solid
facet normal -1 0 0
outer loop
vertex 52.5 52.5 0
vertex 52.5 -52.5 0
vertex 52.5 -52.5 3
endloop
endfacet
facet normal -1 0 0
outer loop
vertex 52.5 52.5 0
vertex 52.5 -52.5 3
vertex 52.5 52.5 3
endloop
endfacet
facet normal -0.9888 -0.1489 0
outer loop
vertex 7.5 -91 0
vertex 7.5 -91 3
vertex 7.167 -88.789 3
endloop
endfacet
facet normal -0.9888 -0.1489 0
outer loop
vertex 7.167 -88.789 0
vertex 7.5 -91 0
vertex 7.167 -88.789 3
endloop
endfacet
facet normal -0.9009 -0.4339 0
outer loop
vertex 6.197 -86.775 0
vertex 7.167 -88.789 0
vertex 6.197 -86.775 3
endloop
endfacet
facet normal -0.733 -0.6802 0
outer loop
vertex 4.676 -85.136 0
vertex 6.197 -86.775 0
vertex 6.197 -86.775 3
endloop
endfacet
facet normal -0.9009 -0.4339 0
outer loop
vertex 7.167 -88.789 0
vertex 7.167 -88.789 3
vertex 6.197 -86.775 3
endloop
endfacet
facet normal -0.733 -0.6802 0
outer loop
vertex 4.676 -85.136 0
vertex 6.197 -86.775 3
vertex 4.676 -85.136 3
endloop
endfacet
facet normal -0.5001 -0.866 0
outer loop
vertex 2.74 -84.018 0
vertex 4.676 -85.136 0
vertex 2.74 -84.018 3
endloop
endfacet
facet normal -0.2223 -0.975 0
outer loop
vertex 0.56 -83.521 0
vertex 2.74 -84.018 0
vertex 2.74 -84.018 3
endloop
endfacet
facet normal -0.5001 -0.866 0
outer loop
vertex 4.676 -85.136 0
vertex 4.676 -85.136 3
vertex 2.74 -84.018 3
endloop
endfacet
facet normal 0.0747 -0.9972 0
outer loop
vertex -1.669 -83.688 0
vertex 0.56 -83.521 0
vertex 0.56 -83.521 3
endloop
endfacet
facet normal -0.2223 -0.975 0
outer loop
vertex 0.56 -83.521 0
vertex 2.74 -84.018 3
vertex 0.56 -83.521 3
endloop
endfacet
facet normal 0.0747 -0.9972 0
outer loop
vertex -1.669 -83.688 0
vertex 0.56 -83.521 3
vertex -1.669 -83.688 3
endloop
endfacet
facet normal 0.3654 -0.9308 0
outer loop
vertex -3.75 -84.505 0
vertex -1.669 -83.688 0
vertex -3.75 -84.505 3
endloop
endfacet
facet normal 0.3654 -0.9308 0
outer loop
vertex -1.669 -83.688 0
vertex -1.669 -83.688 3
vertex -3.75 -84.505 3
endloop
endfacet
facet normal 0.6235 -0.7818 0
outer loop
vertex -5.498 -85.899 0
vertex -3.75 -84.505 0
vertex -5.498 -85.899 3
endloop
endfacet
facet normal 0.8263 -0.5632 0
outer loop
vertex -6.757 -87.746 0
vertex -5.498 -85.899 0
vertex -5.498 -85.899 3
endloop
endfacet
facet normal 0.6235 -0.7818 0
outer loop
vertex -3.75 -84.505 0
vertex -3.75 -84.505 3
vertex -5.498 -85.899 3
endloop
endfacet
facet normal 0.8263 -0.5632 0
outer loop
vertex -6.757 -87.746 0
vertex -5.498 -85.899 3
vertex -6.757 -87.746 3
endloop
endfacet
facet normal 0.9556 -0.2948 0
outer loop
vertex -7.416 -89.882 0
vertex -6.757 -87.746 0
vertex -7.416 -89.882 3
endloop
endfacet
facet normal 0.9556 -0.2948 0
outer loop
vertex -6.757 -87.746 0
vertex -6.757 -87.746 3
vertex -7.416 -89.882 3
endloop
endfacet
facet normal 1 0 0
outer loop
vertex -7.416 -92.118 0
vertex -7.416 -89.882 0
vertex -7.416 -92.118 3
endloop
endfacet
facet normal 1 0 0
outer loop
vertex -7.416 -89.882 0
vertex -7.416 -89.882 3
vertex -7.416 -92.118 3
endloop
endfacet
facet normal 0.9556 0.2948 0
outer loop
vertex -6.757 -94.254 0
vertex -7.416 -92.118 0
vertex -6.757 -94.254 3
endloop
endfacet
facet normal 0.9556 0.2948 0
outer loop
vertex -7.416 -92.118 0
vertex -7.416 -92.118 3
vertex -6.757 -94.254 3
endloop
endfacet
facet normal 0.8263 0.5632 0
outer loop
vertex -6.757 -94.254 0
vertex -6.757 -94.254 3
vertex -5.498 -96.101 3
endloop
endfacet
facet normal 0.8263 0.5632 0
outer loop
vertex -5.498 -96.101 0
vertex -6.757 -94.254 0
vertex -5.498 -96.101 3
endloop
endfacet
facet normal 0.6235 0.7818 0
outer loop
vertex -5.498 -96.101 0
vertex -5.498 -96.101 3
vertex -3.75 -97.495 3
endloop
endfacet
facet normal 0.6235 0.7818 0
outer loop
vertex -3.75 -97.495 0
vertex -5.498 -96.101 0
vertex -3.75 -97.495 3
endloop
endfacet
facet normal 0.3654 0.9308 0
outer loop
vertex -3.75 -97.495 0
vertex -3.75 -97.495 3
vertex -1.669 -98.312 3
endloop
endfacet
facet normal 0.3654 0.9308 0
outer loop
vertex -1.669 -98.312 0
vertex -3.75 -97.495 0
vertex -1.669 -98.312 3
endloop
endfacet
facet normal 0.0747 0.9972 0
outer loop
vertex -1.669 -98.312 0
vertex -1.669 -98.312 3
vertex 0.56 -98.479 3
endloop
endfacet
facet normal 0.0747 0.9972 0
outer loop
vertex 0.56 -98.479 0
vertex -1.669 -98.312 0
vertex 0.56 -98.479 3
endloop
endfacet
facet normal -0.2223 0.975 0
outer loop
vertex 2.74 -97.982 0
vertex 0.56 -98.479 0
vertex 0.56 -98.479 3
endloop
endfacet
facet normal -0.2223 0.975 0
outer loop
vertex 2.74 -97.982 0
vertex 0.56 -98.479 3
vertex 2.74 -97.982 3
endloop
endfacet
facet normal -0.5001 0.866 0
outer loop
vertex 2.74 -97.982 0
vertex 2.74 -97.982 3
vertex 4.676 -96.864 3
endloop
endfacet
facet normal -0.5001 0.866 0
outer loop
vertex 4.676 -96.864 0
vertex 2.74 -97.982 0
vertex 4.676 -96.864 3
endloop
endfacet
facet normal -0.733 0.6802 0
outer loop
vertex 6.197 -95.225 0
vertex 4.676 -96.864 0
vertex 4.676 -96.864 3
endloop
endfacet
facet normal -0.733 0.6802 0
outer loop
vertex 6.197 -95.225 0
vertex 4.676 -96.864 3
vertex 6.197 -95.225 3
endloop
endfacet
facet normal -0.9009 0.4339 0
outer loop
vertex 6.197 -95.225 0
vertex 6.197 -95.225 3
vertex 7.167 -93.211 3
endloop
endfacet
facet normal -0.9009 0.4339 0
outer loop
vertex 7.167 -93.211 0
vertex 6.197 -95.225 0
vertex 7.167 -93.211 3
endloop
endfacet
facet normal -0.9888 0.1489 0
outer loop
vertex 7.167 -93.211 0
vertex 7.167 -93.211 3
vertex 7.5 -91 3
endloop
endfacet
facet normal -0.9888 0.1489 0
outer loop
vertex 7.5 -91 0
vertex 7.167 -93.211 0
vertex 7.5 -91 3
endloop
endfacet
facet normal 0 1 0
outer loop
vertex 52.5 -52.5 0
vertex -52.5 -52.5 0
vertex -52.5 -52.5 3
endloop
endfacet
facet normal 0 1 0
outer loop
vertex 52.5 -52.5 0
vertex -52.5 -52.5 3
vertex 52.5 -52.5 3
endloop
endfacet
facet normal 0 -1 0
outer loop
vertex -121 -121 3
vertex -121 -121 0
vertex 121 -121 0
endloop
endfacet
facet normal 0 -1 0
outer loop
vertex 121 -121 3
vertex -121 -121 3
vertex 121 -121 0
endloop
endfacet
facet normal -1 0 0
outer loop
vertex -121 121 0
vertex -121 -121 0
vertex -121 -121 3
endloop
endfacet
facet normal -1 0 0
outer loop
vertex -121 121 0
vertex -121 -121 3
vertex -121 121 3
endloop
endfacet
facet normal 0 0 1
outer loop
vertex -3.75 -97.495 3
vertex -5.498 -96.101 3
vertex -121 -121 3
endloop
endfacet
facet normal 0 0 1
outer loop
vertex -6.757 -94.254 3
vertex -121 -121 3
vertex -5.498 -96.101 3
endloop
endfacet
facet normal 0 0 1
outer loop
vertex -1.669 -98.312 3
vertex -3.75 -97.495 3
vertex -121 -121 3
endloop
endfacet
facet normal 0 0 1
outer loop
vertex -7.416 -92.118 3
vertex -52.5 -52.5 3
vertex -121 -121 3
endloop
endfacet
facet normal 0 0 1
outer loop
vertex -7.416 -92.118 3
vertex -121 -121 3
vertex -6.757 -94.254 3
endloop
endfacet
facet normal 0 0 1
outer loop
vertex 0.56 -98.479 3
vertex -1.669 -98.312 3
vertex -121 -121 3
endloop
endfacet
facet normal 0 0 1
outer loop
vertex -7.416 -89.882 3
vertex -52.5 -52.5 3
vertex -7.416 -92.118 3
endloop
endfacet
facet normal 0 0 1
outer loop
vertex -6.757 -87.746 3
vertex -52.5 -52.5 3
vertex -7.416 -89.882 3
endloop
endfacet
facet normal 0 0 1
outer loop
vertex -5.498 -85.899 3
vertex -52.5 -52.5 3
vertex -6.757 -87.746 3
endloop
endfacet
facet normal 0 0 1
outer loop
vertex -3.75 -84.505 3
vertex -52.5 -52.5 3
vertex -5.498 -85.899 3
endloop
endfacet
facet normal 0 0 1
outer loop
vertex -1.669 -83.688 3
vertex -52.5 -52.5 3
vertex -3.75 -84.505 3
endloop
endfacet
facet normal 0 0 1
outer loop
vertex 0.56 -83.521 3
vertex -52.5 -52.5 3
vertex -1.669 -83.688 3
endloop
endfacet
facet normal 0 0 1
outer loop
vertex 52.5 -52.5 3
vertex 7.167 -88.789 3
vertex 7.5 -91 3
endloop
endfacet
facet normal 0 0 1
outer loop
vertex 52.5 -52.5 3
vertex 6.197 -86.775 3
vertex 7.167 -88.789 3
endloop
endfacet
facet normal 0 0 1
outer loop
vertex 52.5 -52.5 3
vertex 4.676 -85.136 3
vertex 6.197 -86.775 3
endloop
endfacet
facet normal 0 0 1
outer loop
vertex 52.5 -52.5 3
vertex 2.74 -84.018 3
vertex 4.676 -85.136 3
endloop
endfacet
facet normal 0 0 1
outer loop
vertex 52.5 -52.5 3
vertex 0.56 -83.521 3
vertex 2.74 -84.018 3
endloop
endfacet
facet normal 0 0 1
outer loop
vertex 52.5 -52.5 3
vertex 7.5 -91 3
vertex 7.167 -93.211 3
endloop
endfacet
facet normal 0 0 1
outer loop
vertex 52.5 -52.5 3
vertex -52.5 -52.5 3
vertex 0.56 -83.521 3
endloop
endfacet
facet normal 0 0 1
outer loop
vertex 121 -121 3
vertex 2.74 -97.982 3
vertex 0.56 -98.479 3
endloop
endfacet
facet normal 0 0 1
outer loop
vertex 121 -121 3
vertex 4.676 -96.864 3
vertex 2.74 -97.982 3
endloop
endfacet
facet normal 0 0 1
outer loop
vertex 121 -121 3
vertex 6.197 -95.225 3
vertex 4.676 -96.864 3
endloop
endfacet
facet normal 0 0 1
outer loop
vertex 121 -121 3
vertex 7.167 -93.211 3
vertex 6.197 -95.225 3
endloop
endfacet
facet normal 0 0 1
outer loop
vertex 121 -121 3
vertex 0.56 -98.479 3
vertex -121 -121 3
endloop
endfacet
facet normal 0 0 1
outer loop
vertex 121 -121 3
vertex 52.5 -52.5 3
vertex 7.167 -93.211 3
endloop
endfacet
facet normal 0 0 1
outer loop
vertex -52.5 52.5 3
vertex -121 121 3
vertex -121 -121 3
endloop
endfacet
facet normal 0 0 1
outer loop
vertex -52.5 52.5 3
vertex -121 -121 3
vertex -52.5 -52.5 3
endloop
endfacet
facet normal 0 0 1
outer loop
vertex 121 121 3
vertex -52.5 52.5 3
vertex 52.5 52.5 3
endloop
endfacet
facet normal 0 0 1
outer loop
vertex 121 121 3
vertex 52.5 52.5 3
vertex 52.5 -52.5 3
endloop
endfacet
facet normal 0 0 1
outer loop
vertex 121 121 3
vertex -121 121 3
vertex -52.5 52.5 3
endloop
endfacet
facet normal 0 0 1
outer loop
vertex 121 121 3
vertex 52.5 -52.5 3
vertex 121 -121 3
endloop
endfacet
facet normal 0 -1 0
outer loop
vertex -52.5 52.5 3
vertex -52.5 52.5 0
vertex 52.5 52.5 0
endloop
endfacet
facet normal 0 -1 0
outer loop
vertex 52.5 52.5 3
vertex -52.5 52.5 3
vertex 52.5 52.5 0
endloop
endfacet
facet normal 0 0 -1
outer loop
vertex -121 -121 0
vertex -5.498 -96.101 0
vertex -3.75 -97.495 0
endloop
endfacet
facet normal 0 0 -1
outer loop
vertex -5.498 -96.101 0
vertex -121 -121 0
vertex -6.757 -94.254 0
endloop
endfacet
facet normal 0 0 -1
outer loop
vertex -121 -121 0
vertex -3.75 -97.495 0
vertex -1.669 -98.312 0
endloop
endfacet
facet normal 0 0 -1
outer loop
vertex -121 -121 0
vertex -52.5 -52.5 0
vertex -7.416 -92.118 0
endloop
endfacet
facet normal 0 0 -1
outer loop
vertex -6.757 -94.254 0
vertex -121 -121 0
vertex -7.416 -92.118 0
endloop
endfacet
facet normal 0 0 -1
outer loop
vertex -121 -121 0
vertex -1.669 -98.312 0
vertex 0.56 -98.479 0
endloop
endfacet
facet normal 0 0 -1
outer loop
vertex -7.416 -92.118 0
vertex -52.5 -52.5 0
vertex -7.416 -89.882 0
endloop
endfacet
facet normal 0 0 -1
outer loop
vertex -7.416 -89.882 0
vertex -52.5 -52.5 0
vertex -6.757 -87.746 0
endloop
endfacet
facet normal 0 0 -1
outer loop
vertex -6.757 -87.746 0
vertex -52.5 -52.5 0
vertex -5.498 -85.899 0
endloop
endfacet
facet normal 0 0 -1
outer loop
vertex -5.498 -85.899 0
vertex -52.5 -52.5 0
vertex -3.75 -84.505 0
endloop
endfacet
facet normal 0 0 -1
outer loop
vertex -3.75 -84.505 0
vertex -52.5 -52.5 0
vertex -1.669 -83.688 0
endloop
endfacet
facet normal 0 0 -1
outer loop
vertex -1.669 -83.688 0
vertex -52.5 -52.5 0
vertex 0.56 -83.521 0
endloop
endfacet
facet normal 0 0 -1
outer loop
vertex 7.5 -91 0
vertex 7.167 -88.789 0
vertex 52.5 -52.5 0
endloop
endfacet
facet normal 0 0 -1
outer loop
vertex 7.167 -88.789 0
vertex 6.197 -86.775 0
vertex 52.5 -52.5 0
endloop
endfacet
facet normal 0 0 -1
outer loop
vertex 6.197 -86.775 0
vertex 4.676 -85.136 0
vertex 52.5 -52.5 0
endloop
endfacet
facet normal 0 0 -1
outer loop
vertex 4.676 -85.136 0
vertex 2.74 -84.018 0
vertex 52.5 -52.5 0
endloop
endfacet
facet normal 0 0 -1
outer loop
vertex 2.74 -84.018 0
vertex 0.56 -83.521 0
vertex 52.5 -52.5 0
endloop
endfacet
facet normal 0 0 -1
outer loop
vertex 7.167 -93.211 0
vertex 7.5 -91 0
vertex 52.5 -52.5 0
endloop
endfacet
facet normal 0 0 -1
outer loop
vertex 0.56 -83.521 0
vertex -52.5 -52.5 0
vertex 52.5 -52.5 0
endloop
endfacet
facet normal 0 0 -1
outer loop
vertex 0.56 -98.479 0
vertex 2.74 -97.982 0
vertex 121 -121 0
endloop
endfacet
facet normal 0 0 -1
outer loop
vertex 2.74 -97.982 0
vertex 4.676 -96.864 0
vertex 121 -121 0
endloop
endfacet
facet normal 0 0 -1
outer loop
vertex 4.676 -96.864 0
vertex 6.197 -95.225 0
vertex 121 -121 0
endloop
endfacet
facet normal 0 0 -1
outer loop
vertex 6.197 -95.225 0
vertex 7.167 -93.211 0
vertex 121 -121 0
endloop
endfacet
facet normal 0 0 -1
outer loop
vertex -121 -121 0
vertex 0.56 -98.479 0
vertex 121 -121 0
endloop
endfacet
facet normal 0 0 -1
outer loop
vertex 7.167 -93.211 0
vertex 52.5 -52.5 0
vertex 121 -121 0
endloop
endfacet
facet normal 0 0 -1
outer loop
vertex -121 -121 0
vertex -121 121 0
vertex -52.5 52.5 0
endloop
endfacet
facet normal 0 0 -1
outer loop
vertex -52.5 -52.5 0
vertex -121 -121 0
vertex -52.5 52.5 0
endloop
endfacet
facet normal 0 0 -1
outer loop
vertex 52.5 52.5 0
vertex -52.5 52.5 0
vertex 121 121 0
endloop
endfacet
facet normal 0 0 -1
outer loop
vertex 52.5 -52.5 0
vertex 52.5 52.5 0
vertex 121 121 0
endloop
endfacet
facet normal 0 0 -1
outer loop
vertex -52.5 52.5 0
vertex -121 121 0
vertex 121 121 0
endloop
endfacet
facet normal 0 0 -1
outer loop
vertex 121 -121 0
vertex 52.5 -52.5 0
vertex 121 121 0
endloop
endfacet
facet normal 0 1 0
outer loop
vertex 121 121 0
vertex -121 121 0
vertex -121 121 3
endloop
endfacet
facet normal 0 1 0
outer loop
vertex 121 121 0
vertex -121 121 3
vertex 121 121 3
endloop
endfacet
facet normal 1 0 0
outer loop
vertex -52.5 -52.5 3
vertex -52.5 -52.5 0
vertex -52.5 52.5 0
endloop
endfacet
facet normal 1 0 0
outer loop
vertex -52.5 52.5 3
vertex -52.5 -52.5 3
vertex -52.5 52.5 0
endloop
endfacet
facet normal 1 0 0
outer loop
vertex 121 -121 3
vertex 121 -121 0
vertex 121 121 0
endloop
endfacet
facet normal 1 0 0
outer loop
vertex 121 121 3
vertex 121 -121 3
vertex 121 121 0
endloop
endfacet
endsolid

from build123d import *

# Parameters (mm, degrees)
SKETCH1_W           = 242
SKETCH1_H           = 242
SKETCH1_W_2         = 105
SKETCH1_H_2         = 105
BOSS_EXTRUDE1_DEPTH = 3
CUT_EXTRUDE1_REACH  = 5
SKETCH2_R           = 7.5


with BuildPart() as part:
    # Sketch1 → Boss-Extrude1 (new body)
    with BuildSketch(Plane.XY):
        Rectangle(SKETCH1_W, SKETCH1_H)
        Rectangle(SKETCH1_W_2, SKETCH1_H_2, mode=Mode.SUBTRACT)
    extrude(amount=BOSS_EXTRUDE1_DEPTH)

    # Sketch2 → Cut-Extrude1 (cut, up to next)
    with BuildSketch(Plane.XY.offset(3), mode=Mode.PRIVATE) as cut_extrude1_sk1:
        with Locations((0, -91)):
            Circle(SKETCH2_R)
    cut_extrude1_tool1 = extrude(cut_extrude1_sk1.sketch, amount=-CUT_EXTRUDE1_REACH, mode=Mode.PRIVATE) & part.part
    add(cut_extrude1_tool1.solids().sort_by_distance((0, -91, 3))[0], mode=Mode.SUBTRACT)


solid = part.part
